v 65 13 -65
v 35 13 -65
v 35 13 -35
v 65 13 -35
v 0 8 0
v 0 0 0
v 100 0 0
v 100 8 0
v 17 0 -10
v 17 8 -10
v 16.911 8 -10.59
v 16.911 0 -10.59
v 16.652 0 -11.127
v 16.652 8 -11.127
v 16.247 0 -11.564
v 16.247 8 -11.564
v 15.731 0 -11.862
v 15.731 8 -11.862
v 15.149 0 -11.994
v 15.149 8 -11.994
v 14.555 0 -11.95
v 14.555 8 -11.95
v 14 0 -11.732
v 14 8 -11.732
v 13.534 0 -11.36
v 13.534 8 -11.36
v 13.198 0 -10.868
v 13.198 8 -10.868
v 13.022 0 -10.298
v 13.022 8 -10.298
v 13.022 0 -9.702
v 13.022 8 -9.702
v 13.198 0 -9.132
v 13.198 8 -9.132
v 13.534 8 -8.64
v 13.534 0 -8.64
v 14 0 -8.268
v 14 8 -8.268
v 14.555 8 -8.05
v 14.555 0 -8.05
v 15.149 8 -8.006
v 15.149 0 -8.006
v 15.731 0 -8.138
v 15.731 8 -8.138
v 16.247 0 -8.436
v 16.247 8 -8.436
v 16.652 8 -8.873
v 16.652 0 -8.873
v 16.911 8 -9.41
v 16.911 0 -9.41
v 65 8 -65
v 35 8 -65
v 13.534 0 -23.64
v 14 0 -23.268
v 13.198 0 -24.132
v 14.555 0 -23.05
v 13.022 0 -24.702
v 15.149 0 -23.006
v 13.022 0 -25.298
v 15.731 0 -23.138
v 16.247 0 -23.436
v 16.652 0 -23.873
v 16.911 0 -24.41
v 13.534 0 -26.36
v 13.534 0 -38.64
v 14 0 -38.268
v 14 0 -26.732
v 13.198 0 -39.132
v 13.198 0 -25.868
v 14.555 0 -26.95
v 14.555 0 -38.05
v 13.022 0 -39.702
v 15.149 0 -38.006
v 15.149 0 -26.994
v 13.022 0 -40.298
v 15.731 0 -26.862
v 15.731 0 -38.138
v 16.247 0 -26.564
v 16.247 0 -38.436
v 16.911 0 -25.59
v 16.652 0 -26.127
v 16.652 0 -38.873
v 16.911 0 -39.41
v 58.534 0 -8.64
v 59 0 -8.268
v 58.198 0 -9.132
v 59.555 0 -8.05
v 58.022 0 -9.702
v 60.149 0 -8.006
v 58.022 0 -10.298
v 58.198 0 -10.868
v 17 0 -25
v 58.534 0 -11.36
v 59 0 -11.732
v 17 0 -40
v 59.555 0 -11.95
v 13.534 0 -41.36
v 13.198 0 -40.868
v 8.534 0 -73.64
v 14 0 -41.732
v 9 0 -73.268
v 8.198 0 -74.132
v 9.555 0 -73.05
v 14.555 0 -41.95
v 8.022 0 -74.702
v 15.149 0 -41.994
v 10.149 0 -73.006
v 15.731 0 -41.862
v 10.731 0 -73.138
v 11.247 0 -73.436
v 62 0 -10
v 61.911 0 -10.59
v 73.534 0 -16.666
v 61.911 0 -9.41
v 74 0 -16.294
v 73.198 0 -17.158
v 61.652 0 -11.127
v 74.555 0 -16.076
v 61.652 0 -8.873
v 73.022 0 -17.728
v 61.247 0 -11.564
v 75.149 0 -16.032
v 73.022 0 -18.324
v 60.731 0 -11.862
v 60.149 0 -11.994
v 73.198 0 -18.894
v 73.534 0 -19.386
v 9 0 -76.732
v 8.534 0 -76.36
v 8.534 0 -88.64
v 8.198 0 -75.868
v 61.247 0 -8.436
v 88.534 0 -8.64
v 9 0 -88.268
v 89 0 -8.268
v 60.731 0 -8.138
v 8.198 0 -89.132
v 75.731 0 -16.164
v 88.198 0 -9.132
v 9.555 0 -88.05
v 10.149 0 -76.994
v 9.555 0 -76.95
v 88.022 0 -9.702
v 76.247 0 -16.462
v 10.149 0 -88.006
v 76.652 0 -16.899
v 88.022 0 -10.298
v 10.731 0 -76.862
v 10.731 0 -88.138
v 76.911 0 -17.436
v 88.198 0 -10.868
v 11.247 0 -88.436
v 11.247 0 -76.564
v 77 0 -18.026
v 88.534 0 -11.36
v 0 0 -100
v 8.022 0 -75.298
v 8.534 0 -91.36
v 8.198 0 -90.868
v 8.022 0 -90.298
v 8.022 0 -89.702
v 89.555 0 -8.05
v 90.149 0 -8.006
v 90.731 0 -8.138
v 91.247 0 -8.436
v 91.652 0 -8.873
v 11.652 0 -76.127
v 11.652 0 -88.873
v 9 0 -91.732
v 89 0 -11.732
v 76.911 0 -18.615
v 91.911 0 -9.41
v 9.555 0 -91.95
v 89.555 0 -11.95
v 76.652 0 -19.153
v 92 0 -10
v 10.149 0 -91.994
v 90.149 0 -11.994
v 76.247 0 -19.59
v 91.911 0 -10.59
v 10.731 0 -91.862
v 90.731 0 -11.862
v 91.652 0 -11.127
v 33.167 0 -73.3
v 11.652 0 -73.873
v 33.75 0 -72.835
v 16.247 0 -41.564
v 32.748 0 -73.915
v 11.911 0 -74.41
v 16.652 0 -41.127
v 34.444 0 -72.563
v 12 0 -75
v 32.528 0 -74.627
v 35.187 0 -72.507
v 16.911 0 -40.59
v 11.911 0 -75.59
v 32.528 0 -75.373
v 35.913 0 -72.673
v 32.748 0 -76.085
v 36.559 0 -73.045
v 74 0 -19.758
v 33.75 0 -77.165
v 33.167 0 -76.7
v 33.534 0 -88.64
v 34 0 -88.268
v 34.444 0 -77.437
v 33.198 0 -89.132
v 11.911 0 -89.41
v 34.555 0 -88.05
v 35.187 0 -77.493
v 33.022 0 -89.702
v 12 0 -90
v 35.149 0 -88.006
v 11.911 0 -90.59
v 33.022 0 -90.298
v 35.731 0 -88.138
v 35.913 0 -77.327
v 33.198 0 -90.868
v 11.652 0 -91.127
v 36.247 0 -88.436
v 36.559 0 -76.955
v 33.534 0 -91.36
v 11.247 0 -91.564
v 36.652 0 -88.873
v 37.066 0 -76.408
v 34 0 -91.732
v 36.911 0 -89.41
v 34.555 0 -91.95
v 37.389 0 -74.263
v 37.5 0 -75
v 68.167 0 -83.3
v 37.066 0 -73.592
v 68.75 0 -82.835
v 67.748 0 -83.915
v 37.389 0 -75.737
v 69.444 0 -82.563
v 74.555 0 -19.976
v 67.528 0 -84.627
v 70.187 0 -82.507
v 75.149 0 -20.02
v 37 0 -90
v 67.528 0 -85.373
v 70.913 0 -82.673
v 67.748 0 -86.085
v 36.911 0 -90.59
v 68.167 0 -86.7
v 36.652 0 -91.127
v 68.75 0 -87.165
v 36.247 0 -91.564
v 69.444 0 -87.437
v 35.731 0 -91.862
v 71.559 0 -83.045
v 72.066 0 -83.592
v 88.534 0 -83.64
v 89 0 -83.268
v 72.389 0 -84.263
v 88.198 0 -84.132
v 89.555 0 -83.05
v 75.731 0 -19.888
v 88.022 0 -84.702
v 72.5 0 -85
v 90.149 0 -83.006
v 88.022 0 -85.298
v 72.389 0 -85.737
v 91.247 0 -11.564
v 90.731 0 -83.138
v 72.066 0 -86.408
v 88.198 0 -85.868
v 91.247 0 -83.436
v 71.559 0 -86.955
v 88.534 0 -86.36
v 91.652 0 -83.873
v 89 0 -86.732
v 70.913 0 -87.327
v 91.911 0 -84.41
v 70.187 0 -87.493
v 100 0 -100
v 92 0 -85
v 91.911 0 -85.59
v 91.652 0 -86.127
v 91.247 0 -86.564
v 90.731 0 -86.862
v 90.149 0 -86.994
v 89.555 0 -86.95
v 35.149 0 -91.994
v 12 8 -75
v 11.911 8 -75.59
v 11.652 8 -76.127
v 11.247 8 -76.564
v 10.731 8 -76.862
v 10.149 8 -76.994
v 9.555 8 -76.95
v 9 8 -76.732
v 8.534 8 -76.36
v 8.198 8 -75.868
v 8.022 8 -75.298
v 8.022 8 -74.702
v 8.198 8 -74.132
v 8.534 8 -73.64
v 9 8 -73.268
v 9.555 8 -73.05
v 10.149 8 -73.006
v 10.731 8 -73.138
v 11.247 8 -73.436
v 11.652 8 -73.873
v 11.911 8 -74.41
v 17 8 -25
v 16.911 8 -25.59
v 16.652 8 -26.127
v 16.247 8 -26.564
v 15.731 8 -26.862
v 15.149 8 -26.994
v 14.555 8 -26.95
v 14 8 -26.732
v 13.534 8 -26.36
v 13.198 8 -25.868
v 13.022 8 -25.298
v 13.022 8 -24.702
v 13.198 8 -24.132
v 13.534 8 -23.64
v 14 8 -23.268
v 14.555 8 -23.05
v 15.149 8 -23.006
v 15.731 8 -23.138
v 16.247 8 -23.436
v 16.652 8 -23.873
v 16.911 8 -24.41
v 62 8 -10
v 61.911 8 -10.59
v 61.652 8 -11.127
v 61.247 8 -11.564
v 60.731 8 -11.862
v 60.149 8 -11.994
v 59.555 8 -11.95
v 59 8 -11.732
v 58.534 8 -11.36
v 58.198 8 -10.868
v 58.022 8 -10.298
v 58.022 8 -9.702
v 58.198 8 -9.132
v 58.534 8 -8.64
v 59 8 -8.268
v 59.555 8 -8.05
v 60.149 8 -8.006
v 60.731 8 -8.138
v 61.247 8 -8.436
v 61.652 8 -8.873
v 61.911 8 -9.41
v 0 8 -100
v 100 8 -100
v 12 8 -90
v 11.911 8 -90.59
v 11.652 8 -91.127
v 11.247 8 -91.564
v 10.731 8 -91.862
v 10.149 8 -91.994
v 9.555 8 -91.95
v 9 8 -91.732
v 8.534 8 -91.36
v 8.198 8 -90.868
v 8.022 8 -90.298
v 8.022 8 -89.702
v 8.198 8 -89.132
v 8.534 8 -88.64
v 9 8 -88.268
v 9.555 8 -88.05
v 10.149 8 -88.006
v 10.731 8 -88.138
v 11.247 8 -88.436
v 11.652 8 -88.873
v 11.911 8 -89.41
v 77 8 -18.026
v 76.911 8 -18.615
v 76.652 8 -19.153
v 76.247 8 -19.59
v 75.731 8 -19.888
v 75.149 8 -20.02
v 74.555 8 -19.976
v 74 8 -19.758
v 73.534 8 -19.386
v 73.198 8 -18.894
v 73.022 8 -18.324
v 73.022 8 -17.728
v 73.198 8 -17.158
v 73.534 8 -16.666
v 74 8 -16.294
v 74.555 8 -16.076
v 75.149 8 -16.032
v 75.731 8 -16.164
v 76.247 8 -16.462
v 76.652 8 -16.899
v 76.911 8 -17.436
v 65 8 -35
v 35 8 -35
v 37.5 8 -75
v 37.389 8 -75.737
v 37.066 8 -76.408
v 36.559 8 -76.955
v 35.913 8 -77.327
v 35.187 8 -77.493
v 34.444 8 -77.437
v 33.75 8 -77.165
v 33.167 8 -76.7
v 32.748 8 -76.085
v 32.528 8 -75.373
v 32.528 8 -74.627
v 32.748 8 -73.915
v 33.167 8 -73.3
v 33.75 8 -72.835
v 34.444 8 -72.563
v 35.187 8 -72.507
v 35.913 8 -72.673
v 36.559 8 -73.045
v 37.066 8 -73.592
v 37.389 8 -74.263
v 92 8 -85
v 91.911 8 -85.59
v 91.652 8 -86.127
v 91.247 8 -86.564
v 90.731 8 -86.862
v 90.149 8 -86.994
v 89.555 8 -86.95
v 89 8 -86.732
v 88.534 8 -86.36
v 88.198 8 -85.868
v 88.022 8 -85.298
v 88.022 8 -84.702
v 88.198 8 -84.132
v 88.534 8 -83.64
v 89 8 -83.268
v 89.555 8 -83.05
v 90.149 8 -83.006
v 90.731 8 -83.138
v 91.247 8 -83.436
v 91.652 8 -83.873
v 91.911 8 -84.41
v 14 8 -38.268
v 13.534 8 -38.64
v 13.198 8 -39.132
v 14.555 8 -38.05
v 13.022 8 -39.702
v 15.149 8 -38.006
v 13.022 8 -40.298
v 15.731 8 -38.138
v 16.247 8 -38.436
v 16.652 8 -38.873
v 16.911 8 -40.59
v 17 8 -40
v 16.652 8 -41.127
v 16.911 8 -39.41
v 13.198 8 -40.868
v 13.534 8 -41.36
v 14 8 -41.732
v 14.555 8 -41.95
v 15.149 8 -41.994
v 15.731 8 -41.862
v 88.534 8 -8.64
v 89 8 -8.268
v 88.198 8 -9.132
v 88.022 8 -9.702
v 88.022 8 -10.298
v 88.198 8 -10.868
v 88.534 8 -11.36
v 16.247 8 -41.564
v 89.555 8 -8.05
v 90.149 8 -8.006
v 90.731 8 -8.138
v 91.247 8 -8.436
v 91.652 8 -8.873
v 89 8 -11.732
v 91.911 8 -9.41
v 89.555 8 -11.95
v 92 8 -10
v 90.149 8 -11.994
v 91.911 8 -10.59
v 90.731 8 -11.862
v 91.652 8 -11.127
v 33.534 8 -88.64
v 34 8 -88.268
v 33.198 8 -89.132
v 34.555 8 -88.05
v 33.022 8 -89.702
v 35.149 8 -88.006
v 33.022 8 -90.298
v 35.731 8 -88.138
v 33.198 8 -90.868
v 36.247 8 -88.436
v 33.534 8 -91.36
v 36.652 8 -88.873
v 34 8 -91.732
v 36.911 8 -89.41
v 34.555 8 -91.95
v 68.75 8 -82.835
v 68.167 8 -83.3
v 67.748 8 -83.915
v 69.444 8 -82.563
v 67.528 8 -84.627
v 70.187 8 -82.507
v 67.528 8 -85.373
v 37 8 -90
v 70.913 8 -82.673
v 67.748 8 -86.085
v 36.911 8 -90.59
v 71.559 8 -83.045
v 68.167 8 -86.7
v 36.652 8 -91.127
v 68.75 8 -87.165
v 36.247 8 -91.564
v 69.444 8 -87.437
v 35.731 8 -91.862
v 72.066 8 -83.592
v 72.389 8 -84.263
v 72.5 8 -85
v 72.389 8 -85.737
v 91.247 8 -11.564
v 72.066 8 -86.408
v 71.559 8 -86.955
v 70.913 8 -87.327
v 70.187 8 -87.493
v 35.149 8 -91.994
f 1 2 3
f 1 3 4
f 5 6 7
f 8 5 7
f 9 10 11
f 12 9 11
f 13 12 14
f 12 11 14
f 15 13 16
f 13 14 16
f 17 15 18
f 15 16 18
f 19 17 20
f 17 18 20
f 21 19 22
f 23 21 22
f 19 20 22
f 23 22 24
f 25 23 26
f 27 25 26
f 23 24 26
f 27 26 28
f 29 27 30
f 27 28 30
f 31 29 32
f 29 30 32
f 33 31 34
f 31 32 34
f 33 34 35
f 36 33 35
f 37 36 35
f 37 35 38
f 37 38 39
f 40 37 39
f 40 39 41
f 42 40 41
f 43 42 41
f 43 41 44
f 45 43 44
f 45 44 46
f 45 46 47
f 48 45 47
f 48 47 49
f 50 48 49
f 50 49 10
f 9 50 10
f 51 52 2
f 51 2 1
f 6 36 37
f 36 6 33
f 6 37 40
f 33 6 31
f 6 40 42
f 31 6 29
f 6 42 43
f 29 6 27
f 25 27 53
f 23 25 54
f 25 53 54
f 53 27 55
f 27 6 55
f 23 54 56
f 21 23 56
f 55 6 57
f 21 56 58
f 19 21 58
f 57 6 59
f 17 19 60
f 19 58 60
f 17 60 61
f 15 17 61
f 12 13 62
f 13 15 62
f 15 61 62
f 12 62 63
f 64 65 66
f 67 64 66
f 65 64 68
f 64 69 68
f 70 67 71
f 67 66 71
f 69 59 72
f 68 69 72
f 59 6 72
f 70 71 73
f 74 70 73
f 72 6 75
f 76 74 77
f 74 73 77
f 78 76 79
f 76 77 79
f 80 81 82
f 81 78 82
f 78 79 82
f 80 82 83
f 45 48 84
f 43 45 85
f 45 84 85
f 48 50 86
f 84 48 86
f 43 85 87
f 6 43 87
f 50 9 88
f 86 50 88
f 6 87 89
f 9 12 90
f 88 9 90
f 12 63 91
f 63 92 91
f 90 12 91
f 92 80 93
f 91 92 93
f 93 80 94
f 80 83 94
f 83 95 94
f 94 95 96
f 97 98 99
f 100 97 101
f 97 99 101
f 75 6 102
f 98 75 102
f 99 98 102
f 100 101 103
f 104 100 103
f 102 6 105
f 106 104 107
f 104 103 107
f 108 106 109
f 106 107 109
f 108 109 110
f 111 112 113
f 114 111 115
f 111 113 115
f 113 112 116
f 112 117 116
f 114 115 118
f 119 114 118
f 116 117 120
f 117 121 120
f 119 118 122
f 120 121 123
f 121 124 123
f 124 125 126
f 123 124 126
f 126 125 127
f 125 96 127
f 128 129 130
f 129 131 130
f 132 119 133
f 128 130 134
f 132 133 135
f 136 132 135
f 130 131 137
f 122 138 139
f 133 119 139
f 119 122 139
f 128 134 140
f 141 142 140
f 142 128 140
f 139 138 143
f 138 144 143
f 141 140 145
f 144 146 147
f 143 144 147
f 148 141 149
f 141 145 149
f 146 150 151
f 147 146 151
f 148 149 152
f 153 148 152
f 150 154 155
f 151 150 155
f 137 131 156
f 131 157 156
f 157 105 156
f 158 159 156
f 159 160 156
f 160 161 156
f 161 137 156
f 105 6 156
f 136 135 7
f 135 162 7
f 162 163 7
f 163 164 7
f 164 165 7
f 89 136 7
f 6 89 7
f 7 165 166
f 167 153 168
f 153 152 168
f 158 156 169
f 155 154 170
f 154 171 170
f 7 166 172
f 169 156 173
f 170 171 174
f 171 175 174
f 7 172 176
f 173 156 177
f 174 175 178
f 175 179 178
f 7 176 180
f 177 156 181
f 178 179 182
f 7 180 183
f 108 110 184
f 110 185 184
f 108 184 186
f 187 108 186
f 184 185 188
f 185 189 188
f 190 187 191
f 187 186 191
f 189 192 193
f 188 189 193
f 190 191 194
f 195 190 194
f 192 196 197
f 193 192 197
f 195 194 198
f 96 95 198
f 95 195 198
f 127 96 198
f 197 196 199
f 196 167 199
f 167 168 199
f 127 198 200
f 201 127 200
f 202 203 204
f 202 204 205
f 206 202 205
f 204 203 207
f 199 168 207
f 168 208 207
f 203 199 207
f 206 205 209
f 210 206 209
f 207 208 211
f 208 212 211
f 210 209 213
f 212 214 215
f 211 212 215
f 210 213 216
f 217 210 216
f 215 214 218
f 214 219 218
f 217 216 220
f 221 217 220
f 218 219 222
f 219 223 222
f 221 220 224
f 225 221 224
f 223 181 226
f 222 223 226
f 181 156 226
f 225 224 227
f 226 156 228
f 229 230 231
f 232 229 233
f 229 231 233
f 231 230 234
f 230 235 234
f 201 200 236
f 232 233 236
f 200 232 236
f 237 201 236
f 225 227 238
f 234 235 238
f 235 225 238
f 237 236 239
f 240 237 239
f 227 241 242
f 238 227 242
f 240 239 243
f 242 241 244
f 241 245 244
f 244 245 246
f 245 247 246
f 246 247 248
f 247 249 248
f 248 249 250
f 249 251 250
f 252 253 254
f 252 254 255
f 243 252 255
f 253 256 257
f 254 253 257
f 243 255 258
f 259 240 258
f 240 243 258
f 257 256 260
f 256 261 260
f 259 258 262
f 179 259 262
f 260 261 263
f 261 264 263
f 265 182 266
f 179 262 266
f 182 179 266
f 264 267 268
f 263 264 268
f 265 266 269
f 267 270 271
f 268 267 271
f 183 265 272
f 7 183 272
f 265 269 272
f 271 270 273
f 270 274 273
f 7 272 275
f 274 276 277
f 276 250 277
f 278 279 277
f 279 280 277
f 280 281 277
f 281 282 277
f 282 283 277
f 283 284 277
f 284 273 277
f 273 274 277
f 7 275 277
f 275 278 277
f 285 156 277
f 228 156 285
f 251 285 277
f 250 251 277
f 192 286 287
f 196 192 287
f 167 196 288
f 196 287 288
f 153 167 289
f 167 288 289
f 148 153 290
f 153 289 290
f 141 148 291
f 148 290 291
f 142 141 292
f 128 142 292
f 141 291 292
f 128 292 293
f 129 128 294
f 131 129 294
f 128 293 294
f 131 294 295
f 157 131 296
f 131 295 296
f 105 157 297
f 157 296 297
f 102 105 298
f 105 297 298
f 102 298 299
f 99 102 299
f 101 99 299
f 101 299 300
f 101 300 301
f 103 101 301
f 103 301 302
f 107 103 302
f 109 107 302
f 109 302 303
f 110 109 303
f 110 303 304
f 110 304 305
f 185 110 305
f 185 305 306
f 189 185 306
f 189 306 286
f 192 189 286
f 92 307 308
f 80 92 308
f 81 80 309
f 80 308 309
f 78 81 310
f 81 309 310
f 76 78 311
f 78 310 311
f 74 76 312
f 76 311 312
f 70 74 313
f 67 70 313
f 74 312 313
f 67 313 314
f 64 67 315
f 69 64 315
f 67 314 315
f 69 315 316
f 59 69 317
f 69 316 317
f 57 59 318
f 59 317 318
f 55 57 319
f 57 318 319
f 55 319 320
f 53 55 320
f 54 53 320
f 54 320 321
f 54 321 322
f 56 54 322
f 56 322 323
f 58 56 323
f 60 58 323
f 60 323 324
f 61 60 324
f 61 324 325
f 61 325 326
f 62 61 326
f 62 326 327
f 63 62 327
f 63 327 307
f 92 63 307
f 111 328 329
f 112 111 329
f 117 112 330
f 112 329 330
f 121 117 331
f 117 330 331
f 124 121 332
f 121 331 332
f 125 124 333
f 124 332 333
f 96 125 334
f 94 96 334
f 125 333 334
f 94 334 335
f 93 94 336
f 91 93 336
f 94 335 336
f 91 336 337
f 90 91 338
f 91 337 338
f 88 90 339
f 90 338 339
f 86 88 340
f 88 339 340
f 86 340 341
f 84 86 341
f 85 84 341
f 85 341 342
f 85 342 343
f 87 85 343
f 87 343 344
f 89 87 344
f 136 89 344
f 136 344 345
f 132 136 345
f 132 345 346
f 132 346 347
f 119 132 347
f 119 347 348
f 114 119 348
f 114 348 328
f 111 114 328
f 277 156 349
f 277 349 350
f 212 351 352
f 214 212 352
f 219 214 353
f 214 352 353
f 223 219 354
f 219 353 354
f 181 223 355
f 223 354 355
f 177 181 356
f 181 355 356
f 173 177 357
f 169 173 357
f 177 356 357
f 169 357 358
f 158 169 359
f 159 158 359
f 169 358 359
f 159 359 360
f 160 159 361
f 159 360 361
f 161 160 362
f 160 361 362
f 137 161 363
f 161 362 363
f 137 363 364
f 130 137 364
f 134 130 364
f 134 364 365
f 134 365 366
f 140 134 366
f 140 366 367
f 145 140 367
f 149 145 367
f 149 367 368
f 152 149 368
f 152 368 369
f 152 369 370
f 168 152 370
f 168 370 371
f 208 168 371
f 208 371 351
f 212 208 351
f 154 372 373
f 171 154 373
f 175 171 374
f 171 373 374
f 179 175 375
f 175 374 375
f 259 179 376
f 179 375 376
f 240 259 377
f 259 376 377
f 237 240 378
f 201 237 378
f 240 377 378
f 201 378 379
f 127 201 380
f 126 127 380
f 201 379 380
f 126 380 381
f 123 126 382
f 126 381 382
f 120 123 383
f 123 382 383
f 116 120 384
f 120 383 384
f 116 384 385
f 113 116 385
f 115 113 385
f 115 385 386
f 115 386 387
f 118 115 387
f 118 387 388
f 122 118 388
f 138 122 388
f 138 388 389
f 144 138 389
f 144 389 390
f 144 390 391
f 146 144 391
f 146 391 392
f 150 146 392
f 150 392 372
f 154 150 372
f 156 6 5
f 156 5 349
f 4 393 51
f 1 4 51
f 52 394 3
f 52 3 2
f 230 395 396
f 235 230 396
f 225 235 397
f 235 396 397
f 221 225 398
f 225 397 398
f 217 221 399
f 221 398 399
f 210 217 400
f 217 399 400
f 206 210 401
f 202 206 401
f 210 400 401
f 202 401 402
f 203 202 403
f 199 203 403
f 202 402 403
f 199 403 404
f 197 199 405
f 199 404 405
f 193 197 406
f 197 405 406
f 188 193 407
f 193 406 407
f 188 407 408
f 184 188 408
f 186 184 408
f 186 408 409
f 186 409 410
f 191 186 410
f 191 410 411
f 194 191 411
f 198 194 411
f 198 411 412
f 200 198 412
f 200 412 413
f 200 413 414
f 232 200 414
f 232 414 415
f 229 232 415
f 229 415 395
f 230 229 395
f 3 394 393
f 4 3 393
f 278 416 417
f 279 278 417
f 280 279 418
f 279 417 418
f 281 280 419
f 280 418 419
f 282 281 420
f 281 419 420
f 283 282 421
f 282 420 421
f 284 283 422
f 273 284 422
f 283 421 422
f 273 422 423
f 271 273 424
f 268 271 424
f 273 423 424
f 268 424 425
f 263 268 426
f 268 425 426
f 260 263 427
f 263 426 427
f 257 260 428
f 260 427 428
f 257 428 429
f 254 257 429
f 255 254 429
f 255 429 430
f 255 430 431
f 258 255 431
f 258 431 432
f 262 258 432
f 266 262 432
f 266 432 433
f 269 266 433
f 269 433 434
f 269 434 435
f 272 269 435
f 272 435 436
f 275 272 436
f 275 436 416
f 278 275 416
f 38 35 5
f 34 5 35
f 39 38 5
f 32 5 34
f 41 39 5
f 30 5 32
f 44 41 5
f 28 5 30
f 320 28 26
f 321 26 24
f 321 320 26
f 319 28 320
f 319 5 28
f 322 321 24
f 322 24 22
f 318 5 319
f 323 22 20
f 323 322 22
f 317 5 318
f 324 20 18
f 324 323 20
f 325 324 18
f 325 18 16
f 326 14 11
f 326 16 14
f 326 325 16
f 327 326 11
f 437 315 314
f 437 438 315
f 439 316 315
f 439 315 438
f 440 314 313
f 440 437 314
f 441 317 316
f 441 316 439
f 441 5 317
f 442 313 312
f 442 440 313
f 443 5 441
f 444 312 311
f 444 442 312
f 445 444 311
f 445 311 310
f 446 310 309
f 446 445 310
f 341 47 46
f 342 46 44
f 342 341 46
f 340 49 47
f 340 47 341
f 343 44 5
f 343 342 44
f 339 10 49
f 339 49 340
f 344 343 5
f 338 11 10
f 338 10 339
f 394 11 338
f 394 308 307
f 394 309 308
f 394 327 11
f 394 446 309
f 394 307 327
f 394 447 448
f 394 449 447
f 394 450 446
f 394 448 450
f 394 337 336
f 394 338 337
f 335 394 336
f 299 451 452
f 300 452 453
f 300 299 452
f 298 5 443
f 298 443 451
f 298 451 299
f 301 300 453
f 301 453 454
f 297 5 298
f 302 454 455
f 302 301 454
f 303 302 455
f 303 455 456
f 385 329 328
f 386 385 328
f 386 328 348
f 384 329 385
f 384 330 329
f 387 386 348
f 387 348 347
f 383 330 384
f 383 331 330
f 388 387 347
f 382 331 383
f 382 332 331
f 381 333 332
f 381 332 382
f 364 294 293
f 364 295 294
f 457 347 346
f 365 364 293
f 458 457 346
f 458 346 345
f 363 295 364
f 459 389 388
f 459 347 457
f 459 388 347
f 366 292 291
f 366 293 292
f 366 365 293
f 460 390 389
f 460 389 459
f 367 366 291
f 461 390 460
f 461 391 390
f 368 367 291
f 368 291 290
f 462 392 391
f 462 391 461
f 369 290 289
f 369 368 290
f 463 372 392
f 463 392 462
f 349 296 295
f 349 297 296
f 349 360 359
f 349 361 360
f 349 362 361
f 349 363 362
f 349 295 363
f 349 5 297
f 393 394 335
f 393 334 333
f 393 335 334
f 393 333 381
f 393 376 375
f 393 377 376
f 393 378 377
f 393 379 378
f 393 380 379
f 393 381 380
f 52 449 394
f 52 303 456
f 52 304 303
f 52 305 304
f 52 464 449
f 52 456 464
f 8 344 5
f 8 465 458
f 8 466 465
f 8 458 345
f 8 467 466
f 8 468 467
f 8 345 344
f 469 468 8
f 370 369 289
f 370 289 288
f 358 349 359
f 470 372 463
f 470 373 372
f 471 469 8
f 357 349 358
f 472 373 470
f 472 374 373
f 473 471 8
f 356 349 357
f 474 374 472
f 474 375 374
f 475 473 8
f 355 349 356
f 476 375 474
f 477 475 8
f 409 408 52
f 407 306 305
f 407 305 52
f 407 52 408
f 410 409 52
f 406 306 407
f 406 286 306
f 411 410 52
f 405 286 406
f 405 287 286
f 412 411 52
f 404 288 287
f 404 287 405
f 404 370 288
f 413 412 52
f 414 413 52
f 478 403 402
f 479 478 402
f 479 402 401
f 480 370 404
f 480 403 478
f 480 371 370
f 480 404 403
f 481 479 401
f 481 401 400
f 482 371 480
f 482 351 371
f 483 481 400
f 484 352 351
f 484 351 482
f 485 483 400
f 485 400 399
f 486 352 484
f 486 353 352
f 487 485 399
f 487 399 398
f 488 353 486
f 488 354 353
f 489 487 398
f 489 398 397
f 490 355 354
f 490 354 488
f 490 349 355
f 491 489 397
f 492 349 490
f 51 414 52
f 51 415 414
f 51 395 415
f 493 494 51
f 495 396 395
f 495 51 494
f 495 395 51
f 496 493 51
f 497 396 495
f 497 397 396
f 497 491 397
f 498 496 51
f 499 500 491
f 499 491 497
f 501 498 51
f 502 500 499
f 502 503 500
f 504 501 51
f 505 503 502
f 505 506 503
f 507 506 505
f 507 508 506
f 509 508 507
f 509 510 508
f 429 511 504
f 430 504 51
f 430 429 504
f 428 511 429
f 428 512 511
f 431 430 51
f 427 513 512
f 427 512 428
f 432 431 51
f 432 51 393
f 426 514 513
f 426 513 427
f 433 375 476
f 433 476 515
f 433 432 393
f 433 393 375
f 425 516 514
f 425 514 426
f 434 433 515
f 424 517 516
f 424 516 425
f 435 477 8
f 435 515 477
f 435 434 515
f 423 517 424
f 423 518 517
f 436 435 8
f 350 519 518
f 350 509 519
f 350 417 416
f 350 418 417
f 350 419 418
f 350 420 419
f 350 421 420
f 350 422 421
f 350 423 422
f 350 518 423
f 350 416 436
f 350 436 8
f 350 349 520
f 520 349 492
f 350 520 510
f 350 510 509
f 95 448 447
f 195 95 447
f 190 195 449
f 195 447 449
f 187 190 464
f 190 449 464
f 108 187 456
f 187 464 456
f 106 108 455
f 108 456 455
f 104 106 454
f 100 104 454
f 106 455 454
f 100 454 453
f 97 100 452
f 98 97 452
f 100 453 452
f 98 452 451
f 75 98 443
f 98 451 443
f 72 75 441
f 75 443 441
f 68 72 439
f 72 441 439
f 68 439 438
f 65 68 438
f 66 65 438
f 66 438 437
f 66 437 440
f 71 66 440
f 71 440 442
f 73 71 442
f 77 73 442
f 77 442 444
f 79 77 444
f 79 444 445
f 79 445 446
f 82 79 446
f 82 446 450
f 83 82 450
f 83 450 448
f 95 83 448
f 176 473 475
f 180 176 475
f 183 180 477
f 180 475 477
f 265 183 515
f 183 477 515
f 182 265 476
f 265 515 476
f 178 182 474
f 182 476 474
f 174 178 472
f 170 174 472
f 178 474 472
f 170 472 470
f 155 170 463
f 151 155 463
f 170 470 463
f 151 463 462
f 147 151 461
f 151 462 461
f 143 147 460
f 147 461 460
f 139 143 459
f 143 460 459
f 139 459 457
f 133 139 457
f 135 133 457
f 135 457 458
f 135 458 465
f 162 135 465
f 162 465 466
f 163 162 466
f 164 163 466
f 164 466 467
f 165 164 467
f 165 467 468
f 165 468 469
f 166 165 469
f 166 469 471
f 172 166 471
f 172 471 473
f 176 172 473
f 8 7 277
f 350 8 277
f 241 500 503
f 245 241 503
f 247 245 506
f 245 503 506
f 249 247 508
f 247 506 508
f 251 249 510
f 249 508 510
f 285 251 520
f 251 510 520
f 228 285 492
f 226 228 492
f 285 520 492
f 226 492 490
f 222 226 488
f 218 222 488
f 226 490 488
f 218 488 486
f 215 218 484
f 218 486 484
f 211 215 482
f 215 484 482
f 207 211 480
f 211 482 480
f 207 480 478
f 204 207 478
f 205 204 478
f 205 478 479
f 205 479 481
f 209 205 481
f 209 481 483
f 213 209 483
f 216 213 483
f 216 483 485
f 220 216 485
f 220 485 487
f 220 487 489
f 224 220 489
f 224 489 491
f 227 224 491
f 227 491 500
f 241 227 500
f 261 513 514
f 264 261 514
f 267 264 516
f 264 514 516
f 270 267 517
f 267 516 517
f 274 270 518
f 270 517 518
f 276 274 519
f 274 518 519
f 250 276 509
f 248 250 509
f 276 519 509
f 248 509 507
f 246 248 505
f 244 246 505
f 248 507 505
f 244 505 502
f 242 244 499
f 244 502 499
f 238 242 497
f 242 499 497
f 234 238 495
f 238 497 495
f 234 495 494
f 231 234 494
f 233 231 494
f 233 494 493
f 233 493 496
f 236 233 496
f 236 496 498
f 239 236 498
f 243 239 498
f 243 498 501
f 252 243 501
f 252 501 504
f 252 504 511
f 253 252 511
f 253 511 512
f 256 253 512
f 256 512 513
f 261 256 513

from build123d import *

# Parameters (mm, degrees)
SKETCH1_W           = 100
SKETCH1_H           = 100
BOSS_EXTRUDE1_DEPTH = 8
SKETCH2_W           = 30
SKETCH2_H           = 30
BOSS_EXTRUDE2_DEPTH = 5
SKETCH3_R           = 2
SKETCH3_R_2         = 2.5
CUT_EXTRUDE1_DEPTH  = 19
SKETCH4_R           = 2
SKETCH4_R_2         = 2.5
CUT_EXTRUDE2_DEPTH  = 19
SKETCH5_R           = 2
CUT_EXTRUDE3_DEPTH  = 19
SKETCH6_R           = 2
CUT_EXTRUDE4_DEPTH  = 19


with BuildPart() as part:
    # Sketch1 → Boss-Extrude1 (new body)
    with BuildSketch(Plane(origin=(0, 0, 0), x_dir=(1, 0, 0), z_dir=(0, 1, 0))):
        with Locations((50, 50)):
            Rectangle(SKETCH1_W, SKETCH1_H)
    extrude(amount=BOSS_EXTRUDE1_DEPTH)

    # Sketch2 → Boss-Extrude2 (add)
    with BuildSketch(Plane(origin=(0, 8, 0), x_dir=(1, 0, 0), z_dir=(0, 1, 0))):
        with Locations((50, 50)):
            Rectangle(SKETCH2_W, SKETCH2_H)
    extrude(amount=BOSS_EXTRUDE2_DEPTH)

    # Sketch3 → Cut-Extrude1 (cut)
    with BuildSketch(Plane(origin=(0, 8, 0), x_dir=(1, 0, 0), z_dir=(0, 1, 0))):
        with Locations((10, 90)):
            Circle(SKETCH3_R)
        with Locations((35, 90)):
            Circle(SKETCH3_R)
        with Locations((10, 75)):
            Circle(SKETCH3_R)
        with Locations((35, 75)):
            Circle(SKETCH3_R_2)
    extrude(amount=-CUT_EXTRUDE1_DEPTH, mode=Mode.SUBTRACT)

    # Sketch4 → Cut-Extrude2 (cut)
    with BuildSketch(Plane(origin=(0, 8, 0), x_dir=(1, 0, 0), z_dir=(0, 1, 0))):
        with Locations((90, 85)):
            Circle(SKETCH4_R)
        with Locations((70, 85)):
            Circle(SKETCH4_R_2)
    extrude(amount=-CUT_EXTRUDE2_DEPTH, mode=Mode.SUBTRACT)

    # Sketch5 → Cut-Extrude3 (cut)
    with BuildSketch(Plane(origin=(0, 8, 0), x_dir=(1, 0, 0), z_dir=(0, 1, 0))):
        with Locations((15, 10)):
            Circle(SKETCH5_R)
        with Locations((15, 25)):
            Circle(SKETCH5_R)
        with Locations((15, 40)):
            Circle(SKETCH5_R)
    extrude(amount=-CUT_EXTRUDE3_DEPTH, mode=Mode.SUBTRACT)

    # Sketch6 → Cut-Extrude4 (cut)
    with BuildSketch(Plane(origin=(0, 8, 0), x_dir=(1, 0, 0), z_dir=(0, 1, 0))):
        with Locations((90, 10)):
            Circle(SKETCH6_R)
        with Locations((60, 10)):
            Circle(SKETCH6_R)
        with Locations((75, 18.025911625)):
            Circle(SKETCH6_R)
    extrude(amount=-CUT_EXTRUDE4_DEPTH, mode=Mode.SUBTRACT)


solid = part.part
